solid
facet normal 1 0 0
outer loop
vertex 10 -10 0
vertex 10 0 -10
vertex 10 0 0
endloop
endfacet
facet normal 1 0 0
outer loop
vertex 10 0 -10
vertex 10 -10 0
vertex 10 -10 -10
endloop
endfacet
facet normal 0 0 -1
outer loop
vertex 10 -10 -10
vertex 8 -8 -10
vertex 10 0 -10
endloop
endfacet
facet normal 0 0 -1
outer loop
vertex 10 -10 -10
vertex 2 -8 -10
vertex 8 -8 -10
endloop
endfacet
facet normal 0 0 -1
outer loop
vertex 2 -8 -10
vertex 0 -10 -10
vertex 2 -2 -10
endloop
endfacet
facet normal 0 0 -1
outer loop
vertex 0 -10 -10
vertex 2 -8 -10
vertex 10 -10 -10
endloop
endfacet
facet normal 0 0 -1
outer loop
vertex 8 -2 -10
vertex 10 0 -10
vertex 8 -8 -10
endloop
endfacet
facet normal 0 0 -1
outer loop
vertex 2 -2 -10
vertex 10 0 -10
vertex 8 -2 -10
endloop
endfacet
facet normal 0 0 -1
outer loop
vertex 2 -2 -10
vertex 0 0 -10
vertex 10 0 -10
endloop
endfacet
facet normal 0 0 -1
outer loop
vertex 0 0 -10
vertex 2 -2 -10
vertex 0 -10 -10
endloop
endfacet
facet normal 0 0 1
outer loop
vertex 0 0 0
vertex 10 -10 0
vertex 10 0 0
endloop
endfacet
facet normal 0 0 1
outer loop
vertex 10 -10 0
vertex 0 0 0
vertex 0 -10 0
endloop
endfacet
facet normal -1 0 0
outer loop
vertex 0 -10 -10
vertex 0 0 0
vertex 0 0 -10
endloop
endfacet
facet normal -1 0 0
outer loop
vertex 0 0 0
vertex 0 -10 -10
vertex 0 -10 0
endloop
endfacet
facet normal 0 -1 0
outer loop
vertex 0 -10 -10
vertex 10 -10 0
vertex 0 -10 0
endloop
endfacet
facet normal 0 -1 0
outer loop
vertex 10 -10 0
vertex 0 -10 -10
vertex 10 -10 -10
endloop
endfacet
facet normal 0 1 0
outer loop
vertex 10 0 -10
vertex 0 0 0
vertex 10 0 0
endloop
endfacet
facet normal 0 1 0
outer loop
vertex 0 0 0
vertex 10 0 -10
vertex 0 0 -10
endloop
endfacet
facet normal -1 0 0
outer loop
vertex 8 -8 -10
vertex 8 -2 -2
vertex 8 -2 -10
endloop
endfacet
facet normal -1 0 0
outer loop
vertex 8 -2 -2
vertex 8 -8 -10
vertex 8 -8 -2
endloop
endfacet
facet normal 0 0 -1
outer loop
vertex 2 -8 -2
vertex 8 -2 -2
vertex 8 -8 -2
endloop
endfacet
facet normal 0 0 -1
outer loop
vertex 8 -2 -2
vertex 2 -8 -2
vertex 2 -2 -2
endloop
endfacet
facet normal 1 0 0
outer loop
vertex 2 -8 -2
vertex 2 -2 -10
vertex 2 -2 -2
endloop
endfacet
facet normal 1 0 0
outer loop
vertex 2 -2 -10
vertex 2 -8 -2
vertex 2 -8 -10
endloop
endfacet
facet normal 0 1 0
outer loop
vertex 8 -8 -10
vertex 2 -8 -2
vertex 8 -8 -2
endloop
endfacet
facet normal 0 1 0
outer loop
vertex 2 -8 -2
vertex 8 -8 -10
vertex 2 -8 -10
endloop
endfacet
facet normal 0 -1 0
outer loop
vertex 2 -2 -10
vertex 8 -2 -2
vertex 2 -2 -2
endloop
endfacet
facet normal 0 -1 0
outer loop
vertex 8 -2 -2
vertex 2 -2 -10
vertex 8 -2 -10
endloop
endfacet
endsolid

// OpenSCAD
//box_add();

rotate([180, 0, 0])
	box_sub();

module box_add() {
	union() {
		cube([10, 10, 2]);
		translate([0, 0, 2]) {
			cube([10, 2, 8]);
			cube([2, 10, 8]);
		}
		translate([0, 10 - 2, 2])
			cube([10, 2, 8]);
		translate([10 - 2, 0, 2])
			cube([2, 10, 8]);
/*
		translate([10, 10, 2]) {
		mirror([1, 1, 0]) {
				cube([10, 2, 6]);
				cube([2, 10, 6]);
			}
		}
*/
	}
}

module box_sub() {
	difference() {
		cube([10, 10, 10]);
		translate([2, 2, 2])
			cube([6, 6, 10]);
	}
}
